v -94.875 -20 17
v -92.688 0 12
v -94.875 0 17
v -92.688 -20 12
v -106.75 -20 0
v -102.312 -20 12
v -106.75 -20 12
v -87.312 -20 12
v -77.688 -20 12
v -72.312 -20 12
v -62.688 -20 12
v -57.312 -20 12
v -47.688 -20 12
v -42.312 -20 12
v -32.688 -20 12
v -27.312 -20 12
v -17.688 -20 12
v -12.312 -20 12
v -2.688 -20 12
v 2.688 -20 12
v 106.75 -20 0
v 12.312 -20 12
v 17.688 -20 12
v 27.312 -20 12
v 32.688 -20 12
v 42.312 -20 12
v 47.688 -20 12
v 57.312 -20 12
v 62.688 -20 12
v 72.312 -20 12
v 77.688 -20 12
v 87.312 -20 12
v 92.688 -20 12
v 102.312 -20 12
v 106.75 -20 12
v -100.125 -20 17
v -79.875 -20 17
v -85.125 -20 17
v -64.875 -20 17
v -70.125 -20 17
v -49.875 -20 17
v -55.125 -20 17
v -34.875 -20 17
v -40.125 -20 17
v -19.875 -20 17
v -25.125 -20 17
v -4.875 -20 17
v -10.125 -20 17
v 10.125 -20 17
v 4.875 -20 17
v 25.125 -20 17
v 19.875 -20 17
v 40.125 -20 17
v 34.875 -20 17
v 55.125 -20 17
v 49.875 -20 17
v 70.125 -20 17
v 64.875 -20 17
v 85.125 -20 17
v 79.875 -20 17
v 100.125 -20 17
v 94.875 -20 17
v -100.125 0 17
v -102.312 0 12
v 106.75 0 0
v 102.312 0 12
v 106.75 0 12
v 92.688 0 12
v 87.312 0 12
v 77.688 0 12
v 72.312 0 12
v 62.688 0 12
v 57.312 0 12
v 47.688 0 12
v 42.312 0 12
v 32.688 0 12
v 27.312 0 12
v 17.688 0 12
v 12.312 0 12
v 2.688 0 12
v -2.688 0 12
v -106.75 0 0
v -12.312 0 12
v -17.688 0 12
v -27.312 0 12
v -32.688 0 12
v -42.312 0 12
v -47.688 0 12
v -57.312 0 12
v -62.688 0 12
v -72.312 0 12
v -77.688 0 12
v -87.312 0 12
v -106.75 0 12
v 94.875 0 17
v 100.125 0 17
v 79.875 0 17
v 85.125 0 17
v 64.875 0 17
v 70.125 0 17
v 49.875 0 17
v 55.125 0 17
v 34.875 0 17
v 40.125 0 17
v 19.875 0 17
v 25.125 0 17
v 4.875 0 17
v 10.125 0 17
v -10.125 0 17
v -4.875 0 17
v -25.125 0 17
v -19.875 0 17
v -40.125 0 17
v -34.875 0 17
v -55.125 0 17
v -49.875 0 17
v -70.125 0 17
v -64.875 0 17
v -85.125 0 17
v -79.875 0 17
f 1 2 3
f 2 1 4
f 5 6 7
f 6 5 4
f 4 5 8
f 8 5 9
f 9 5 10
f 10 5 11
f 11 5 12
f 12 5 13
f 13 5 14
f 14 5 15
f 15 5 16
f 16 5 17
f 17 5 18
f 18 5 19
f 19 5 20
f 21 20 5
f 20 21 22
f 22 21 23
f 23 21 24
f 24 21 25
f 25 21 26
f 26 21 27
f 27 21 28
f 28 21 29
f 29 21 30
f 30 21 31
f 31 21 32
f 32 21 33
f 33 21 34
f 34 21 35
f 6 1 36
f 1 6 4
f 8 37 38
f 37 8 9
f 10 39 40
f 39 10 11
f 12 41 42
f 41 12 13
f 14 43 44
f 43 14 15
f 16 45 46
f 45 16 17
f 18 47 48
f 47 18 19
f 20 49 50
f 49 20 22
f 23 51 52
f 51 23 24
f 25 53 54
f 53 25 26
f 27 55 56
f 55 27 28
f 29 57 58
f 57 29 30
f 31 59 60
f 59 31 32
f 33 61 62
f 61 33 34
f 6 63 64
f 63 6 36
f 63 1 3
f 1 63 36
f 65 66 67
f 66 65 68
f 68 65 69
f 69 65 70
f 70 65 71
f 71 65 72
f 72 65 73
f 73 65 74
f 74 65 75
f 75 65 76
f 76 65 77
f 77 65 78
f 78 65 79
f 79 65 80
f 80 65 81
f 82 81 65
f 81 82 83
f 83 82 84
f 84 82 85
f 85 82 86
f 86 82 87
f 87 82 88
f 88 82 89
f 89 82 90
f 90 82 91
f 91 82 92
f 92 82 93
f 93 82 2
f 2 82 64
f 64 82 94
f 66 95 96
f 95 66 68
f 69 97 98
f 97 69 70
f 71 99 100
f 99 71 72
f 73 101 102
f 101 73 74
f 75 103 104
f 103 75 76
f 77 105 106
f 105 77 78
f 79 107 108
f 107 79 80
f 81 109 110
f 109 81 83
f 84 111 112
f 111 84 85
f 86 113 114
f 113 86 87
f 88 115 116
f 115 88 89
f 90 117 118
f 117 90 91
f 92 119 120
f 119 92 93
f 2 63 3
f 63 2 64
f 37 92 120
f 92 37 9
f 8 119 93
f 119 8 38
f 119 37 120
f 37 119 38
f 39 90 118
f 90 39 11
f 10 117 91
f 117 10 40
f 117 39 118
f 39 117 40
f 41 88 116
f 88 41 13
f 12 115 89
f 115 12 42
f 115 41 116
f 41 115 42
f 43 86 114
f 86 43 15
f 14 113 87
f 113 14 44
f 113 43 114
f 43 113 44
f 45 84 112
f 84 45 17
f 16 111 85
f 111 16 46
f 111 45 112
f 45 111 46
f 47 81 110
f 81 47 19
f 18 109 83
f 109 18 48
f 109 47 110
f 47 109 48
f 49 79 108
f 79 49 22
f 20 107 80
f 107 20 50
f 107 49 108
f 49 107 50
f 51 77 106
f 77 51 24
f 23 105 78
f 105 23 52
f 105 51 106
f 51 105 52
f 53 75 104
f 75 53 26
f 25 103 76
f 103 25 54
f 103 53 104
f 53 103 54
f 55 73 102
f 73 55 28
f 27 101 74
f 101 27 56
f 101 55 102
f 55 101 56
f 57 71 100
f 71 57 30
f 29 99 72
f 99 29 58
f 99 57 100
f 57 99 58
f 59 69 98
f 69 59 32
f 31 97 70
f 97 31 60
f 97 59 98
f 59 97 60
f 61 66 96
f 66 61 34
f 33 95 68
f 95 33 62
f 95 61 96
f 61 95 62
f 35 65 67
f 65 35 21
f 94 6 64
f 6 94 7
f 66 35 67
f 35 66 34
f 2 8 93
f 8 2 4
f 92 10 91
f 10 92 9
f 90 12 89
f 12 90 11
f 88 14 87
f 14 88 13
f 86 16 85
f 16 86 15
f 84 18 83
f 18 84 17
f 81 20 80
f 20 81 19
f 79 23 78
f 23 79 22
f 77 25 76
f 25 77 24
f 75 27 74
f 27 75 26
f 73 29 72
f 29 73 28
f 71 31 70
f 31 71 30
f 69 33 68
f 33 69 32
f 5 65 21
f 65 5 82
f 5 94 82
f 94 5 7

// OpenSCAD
$fn = 32;

// ----------------------------------------------------------------------
// Toothed rack, 14 teeth
// 15 mm pitch, 5 mm teeth
// ----------------------------------------------------------------------

// --- parameters (mm) ---
bar_w = 20;      // bar width (Y)
bar_h = 12;      // bar height (Z)
teeth = 14;      // number of teeth
pitch = 15;      // tooth pitch
tooth_h = 5;     // tooth height above the bar
root_w = 10.5;   // tooth width at the root
crest_w = 5.25;  // tooth width at the crest

// --- derived feature positions (mm) ---
span = (teeth - 1) * pitch;  // = 195   distance between the outer teeth
bar_l = span + root_w + 8;   // = 213.5   bar length: teeth plus 4 mm at each end
tooth_x = -span / 2;         // = -97.5   X of the first tooth
height = bar_h + tooth_h;    // = 17   overall height
feature_centers = [
  [tooth_x + 0 * pitch, -bar_w / 2],
  [tooth_x + 1 * pitch, -bar_w / 2],
  [tooth_x + 2 * pitch, -bar_w / 2],
  [tooth_x + 3 * pitch, -bar_w / 2],
  [tooth_x + 4 * pitch, -bar_w / 2],
  [tooth_x + 5 * pitch, -bar_w / 2],
  [tooth_x + 6 * pitch, -bar_w / 2],
  [tooth_x + 7 * pitch, -bar_w / 2],
  [tooth_x + 8 * pitch, -bar_w / 2],
  [tooth_x + 9 * pitch, -bar_w / 2],
  [tooth_x + 10 * pitch, -bar_w / 2],
  [tooth_x + 11 * pitch, -bar_w / 2],
  [tooth_x + 12 * pitch, -bar_w / 2],
  [tooth_x + 13 * pitch, -bar_w / 2]
];   // tooth centre line, drives the tooth loop

// bar with a rack of teeth, one extruded trapezoium per centre
module rack_tooth() {
  linear_extrude(height = bar_w)
    polygon(points = [
      [0, 0],
      [root_w, 0],
      [root_w / 2 + crest_w / 2, tooth_h + 1],
      [root_w / 2 - crest_w / 2, tooth_h + 1]
    ]);
}

union() {
  translate([-bar_l / 2, -bar_w, 0]) cube([bar_l, bar_w, bar_h]);
  for (centre = feature_centers)
    translate([centre[0] - root_w / 2, 0, bar_h - 1]) rotate([90, 0, 0]) rack_tooth();
}
